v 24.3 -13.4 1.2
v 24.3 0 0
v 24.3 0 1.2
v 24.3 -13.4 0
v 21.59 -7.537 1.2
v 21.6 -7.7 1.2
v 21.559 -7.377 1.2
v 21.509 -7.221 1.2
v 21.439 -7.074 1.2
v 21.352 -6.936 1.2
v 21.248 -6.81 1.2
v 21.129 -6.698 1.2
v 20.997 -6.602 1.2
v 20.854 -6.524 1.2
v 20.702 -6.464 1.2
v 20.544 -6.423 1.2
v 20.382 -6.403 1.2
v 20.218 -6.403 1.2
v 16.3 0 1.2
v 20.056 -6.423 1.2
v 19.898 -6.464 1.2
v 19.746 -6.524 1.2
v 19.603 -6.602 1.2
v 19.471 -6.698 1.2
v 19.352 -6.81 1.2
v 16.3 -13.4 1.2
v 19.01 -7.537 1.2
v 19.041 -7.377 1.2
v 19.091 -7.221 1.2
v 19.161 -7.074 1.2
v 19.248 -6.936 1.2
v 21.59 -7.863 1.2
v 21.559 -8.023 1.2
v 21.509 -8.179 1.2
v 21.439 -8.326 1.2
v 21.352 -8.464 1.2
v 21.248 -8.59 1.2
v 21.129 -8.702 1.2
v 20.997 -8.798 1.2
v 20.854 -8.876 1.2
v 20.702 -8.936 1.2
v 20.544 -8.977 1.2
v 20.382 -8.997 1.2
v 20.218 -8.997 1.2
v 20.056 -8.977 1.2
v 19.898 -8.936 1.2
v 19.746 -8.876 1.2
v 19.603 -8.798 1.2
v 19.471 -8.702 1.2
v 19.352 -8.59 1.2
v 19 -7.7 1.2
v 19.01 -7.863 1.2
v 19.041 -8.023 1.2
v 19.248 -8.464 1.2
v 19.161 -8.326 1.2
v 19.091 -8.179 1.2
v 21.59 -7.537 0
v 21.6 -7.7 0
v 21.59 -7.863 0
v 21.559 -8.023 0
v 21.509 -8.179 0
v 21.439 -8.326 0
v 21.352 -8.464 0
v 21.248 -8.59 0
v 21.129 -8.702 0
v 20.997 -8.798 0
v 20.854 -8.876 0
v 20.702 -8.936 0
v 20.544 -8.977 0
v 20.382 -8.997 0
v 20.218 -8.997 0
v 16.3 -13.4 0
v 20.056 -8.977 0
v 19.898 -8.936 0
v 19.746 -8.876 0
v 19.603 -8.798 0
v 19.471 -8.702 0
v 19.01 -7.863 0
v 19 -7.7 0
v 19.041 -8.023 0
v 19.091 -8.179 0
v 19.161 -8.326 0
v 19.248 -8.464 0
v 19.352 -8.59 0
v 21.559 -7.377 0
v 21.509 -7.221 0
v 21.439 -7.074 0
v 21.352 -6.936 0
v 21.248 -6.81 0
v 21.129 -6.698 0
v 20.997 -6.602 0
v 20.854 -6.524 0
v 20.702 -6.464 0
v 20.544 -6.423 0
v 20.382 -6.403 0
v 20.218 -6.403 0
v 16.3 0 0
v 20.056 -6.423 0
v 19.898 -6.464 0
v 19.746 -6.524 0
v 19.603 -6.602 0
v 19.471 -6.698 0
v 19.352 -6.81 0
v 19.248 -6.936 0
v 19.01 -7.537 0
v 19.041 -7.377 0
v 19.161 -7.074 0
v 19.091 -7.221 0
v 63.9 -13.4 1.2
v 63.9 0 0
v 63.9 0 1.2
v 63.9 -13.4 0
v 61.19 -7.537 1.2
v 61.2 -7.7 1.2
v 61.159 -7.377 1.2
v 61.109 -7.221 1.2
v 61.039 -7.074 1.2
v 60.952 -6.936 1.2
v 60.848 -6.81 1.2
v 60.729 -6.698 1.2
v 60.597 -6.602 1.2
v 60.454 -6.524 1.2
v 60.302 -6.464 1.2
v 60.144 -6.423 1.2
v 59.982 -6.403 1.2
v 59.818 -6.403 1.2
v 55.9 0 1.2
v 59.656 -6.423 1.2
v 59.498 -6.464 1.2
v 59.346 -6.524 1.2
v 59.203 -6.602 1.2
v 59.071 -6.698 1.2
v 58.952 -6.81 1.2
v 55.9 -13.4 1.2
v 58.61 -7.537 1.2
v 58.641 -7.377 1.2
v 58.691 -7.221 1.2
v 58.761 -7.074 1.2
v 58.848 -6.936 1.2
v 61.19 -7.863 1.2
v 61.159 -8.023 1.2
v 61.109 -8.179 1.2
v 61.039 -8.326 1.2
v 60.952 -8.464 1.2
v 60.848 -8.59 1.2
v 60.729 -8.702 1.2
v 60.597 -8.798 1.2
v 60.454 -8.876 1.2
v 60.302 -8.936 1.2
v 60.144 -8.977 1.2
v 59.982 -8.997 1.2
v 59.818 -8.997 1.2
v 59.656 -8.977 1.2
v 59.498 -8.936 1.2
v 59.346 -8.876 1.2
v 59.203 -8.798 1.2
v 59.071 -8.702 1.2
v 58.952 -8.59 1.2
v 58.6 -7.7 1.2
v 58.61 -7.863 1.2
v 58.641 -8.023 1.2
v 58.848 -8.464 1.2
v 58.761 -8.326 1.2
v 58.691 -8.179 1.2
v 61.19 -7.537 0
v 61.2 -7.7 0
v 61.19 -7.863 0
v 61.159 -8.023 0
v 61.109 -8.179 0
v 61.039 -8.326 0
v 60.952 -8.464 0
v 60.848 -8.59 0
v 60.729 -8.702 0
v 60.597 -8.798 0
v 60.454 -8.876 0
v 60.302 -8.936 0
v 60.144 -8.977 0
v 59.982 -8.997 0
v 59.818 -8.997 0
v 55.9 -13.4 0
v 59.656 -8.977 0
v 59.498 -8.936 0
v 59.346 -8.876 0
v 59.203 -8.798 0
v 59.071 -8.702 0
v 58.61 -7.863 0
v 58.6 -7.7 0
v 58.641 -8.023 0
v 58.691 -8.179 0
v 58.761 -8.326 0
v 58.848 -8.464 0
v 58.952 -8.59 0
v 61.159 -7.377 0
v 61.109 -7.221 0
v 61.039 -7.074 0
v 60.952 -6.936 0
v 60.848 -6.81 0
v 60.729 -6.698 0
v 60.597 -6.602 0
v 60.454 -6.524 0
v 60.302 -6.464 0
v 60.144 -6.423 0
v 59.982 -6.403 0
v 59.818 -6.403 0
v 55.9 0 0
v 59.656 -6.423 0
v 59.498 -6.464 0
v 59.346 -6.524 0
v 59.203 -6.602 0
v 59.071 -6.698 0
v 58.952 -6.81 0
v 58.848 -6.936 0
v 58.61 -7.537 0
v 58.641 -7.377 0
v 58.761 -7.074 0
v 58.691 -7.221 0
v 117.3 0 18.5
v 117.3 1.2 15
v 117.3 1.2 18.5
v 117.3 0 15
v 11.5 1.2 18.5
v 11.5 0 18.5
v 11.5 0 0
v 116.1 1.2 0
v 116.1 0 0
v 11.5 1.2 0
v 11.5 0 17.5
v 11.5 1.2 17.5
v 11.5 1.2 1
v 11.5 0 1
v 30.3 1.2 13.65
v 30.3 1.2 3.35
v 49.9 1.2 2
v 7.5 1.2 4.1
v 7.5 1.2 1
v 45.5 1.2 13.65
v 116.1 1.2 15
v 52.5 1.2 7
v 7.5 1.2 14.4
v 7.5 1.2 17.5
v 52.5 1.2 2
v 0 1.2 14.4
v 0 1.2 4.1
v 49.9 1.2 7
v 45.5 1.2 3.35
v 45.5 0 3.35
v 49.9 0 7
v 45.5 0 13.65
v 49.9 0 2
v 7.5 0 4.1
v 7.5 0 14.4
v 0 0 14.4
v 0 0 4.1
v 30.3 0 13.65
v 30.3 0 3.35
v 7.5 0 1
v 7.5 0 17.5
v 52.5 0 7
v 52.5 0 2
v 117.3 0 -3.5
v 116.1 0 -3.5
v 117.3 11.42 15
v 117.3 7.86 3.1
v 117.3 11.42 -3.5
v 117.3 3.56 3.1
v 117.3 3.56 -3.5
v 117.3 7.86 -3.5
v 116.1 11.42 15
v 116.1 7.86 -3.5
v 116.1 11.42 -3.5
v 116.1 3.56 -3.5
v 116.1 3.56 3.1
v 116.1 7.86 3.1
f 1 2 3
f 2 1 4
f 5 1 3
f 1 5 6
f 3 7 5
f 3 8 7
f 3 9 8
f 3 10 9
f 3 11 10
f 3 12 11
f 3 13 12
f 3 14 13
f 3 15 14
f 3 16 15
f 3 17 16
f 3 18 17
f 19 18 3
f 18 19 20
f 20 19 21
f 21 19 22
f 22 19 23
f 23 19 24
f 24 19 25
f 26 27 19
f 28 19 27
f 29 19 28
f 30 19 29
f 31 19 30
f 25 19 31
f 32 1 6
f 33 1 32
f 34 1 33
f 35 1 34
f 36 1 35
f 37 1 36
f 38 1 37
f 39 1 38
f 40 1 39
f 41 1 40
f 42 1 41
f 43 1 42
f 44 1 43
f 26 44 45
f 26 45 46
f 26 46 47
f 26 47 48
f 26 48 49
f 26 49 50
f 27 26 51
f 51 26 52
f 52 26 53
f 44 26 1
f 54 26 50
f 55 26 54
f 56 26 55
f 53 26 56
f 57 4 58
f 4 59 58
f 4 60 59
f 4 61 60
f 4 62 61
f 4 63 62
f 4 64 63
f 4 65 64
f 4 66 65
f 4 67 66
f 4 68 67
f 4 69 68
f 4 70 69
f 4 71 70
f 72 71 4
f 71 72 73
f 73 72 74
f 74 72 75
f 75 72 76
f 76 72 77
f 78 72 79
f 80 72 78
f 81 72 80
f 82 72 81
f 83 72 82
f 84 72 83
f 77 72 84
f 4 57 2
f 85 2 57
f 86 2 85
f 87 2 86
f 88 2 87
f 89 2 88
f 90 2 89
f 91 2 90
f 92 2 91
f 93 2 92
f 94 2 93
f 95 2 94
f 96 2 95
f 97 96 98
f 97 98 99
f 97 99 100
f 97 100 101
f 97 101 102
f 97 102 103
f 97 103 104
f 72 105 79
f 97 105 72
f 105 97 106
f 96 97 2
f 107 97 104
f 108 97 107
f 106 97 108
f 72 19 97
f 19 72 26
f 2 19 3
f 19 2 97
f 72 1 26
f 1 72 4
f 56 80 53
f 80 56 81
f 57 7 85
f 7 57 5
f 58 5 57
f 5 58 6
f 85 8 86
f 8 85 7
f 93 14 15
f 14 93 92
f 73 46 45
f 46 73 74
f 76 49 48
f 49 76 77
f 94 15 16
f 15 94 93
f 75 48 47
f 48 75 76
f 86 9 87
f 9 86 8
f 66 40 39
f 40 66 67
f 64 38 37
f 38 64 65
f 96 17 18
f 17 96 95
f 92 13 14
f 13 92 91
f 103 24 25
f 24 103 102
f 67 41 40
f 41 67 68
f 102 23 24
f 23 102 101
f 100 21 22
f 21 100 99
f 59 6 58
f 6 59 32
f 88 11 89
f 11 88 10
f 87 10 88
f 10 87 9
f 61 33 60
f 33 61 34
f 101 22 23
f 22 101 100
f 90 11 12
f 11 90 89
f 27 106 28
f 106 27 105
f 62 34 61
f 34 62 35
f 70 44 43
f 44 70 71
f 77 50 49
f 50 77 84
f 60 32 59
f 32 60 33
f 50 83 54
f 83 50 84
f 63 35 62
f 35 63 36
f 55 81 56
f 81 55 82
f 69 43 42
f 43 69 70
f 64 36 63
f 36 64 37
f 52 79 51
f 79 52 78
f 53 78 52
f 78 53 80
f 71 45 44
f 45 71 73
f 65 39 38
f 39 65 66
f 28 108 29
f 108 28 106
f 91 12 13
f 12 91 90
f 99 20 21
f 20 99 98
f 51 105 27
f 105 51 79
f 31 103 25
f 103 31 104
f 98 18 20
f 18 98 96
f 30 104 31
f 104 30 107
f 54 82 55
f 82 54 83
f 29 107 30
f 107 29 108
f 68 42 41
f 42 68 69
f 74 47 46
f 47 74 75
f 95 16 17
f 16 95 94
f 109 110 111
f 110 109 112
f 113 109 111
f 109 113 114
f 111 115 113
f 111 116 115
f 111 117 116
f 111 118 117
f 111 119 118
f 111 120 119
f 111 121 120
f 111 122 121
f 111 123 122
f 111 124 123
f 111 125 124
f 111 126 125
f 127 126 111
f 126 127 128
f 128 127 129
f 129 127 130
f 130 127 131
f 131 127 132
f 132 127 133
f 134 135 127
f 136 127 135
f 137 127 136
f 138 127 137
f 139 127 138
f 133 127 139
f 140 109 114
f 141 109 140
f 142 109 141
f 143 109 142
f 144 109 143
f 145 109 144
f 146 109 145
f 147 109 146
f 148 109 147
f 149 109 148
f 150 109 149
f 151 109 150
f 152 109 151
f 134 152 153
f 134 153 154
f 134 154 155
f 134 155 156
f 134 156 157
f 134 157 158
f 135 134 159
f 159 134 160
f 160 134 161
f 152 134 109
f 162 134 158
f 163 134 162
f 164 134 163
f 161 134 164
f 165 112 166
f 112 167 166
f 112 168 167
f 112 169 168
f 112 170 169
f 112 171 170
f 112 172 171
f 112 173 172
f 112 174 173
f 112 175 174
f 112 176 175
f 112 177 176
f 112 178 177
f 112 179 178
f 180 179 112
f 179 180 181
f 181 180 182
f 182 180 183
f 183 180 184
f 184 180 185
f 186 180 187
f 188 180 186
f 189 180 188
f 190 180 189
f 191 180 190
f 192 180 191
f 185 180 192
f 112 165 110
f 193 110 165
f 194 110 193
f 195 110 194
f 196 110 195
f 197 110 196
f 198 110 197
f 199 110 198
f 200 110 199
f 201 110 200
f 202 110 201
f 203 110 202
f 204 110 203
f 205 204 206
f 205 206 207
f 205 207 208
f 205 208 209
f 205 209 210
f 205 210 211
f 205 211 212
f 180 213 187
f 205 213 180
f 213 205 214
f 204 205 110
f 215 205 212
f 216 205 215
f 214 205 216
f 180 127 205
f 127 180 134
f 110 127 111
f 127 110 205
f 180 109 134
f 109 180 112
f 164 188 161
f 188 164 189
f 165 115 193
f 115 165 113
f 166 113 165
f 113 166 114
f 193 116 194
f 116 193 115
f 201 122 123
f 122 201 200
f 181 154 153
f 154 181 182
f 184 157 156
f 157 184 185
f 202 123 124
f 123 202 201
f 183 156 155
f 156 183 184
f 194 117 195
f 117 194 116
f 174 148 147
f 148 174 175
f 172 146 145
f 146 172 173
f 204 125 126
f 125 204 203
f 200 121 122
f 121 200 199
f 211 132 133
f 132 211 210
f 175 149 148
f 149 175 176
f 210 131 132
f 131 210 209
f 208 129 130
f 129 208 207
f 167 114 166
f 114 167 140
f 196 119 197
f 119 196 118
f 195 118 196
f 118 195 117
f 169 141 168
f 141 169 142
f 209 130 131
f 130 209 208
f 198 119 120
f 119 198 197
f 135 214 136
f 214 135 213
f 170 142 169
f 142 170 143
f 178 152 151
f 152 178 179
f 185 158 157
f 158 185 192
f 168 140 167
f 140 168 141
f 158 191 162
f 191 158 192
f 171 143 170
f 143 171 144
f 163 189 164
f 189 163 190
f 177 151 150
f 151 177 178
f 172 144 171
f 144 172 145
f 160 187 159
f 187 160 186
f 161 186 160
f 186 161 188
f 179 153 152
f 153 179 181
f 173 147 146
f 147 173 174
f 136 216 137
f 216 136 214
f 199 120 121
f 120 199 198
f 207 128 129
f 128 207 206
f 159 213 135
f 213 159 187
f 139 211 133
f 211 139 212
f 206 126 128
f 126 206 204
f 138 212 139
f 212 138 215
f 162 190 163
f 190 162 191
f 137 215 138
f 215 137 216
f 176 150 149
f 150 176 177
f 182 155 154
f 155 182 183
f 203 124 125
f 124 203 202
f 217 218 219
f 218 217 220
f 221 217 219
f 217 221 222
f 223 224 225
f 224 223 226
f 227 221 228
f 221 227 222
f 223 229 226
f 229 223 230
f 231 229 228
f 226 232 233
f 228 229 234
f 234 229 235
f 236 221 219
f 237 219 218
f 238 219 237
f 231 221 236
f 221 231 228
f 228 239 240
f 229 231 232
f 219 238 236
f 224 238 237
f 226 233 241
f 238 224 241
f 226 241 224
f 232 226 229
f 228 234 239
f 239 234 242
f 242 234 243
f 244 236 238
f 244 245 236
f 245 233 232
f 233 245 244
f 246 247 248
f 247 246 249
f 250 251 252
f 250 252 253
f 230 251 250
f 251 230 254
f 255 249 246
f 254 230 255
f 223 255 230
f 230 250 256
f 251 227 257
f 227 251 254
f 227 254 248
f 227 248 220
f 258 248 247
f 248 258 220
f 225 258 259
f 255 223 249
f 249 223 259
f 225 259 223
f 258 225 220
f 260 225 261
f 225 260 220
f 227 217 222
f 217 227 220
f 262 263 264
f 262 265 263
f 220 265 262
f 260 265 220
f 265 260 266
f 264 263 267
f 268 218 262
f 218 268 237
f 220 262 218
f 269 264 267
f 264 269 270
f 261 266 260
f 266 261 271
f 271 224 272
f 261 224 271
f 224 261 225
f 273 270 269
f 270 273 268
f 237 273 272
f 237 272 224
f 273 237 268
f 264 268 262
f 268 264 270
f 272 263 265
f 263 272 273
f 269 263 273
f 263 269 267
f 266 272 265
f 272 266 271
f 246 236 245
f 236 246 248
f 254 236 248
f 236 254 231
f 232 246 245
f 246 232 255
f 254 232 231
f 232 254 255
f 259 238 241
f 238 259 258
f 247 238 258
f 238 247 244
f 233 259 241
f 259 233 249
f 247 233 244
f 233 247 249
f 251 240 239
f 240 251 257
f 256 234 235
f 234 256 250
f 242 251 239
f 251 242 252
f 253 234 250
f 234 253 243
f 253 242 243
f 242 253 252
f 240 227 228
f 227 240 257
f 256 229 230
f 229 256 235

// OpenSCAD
/*
 * General
 */
materialThickness = 1.2;

/*
 * Bracket
 */
totalBracketWidth = 120.8-3.5;
bracketHeight = 18.5;

/*
 * PCB mount
 */
mountWidth = 8;
mountDepth = 13.4;

mountLeft = 4.8;
mountSpacing = 31.6;

mountingHoleDistance = 4.4;
mountingHoleRadius = 2.6/2;

/*
 * Bottom flap
 */
flapWidth = 7.5;
flapHeight = 10.3;
flapTransition = 4;

/*
 * Top flap
 */
topFlapDepth = 11.42;
topFlapHoleDepth = 4.3;
topFlapHoleHeight = 6.6;

topFlapOffset = -3.5;
drawBottomHole = true;

/*
 * SFP
 */
sfpLeft = 30.3;
sfpBottom = 3.35;

sfpWidth = 15.2;
sfpHeight = 10.3;

/*
 * LED
 */
ledLeft = 4.4;
ledBottom = 2;

ledWidth = 2.6;
ledHeight = 5;

$fn = 50;

/*
 * Calculated
 */
totalFlapWidth = flapWidth + flapTransition;
bracketWidth = totalBracketWidth - totalFlapWidth;

// Draw flap
translate([0, 0, bracketHeight/2-flapHeight/2]) cube([flapWidth, materialThickness, flapHeight]); // Flap
translate([flapWidth, 0, 1]) cube([flapTransition, materialThickness, bracketHeight-2]); // Transition

difference()
{
    group()
    {
        // Move main part before flap
        translate([totalFlapWidth, 0, 0])
        {
            cube([bracketWidth, materialThickness, bracketHeight]); // Main bracket
            
            // Move mounting flaps in front of bracket
            translate([mountLeft, -mountDepth, 0])
            {
                difference()
                {
                    cube([mountWidth, mountDepth, materialThickness]); // First mounting flap
                    translate([mountWidth/2, mountingHoleDistance+mountingHoleRadius, -1]) cylinder(r=mountingHoleRadius, h=materialThickness+2); // Mounting hole
                }
                
                // Move to second mounting flap
                translate([mountWidth+mountSpacing, 0, 0])
                {
                    difference()
                    {
                    cube([mountWidth, mountDepth, materialThickness]); // Second mounting flap
                    translate([mountWidth/2, mountingHoleDistance+mountingHoleRadius, -1]) cylinder(r=mountingHoleRadius, h=materialThickness+2); // Mounting hole
                    }
                }
            }
        }

        // Move to top mounting flap
        translate([totalBracketWidth-materialThickness, 0, topFlapOffset])
        {
            difference()
            {
                cube([materialThickness, topFlapDepth, bracketHeight]); // Top mounting flap
                
                if(drawBottomHole)
                    translate([-1, topFlapDepth/2-topFlapHoleDepth/2, -1]) cube([materialThickness+2, topFlapHoleDepth, topFlapHoleHeight+1]);
            }
        }
    }

    translate([sfpLeft, -1, sfpBottom]) cube([sfpWidth, materialThickness+2, sfpHeight]); // SFP slot
    translate([sfpLeft+sfpWidth+ledLeft, -1, ledBottom]) cube([ledWidth, materialThickness+2, ledHeight]); // LED slot
}
